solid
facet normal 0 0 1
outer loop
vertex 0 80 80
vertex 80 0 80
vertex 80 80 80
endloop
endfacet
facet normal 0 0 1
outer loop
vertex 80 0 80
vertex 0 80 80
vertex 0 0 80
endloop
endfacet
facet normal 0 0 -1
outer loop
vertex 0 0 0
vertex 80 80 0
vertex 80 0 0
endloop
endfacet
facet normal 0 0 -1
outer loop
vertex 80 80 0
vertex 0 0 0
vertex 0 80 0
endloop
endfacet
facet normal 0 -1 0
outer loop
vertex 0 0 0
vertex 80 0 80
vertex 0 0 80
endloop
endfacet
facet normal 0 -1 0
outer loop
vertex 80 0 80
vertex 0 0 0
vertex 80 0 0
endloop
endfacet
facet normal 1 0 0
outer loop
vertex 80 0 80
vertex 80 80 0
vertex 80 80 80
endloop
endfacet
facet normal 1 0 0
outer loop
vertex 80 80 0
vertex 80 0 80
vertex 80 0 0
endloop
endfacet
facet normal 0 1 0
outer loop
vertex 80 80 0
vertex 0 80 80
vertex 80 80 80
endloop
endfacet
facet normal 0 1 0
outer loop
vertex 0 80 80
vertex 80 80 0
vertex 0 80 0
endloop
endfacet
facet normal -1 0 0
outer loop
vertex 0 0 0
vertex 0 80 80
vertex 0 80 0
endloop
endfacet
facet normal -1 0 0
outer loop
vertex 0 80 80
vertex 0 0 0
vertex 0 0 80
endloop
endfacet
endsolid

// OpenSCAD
// file: shared.scad
size = 80;

edges = [
    [ size / 2, 0, 0 ],
    [ size, size / 2, 0 ],
    [ size / 2, size, 0 ],
    [ 0, size / 2, 0 ],
    [ size / 2, 0, size ],
    [ size, size / 2, size ],
    [ size / 2, size, size ],
    [ 0, size / 2, size ],
    [ 0, 0, size / 2 ],
    [ size, 0, size / 2 ],
    [ size, size, size / 2 ],
    [ 0, size, size / 2 ],
];

corners = [
    [ 0, 0, 0 ],
    [ size, 0, 0 ],
    [ size, size, 0 ],
    [ 0, size, 0 ],
    [ 0, 0, size ],
    [ size, 0, size ],
    [ size, size, size ],
    [ 0, size, size ],
];

edges_and_corners = concat(edges, corners);

// label the edges
// We are adjusting the labels by custom offsets and rotations.
translate(edges[0] + [ 0, 0, -5 ]) rotate([ 90, 0, 0 ]) text("E0", size = 5);
translate(edges[1] + [ 0, -3, -5 ]) rotate([ 90, 0, 90 ]) text("E1", size = 5);
translate(edges[2] + [ 5, 0, -5 ]) rotate([ 90, 0, 180 ]) text("E2", size = 5);
translate(edges[3] + [ 0, 0, -5 ]) rotate([ 90, 0, -90 ]) text("E3", size = 5);
translate(edges[4] + [ 0, 0, 2 ]) rotate([ 90, 0, 0 ]) text("E4", size = 5);
translate(edges[5] + [ 0, -3, 2 ]) rotate([ 90, 0, 90 ]) text("E5", size = 5);
translate(edges[6] + [ 5, 0, 2 ]) rotate([ 90, 0, 180 ]) text("E6", size = 5);
translate(edges[7] + [ 0, 3, 2 ]) rotate([ 90, 0, -90 ]) text("E7", size = 5);
translate(edges[8] + [ -1, 0, 0 ]) rotate([ 0, -90, 90 ]) text("E8", size = 5);
translate(edges[9] + [ 5, 0, 0 ]) rotate([ 90, -90, 0 ]) text("E9", size = 5);
translate(edges[10] + [ 1, 0, 0 ]) rotate([ 180, -90, 90 ]) text("E10", size = 5);
translate(edges[11] + [ -1, 0, 0 ]) rotate([ 0, -90, 0 ]) text("E11", size = 5);

// label the corner points
// We are adjusting the labels by custom offsets and rotations.
translate(corners[0] + [ 0, 0, -5 ]) rotate([ 90, 0, 0 ]) text("C12", size = 5);
translate(corners[1] + [ 0, 0, -5 ]) rotate([ 90, 0, 0 ]) text("C13", size = 5);
translate(corners[2] + [ 0, 0, -5 ]) rotate([ 90, 0, 180 ]) text("C14", size = 5);
translate(corners[3] + [ 0, 0, -5 ]) rotate([ 90, 0, 180 ]) text("C15", size = 5);
translate(corners[4]) rotate([ 90, 0, 0 ]) text("C16", size = 5);
translate(corners[5]) rotate([ 90, 0, 0 ]) text("C17", size = 5);
translate(corners[6]) rotate([ 90, 0, 180 ]) text("C18", size = 5);
translate(corners[7]) rotate([ 90, 0, 180 ]) text("C19", size = 5);

module draw_triangles(triangle_table)
{
    for (i = [0:len(triangle_table) - 1])
    {
        indices = triangle_table[i];

        p0 = edges[indices[0]];
        p1 = edges[indices[1]];
        p2 = edges[indices[2]];

        color([ 1, 1, 1, 0.4 ]) polyhedron(points = [ p0, p1, p2 ], faces = [[ 0, 1, 2 ]]);
        echo("Draw triangle: ", indices[0], indices[1], indices[2]);
    }
}

module create_tetrahedra(tetrahedron_table)
{
    for (i = [0:len(tetrahedron_table) - 1])
    {
        indices = tetrahedron_table[i];

        echo("**RESULT tetrahedron ", i, " indices: ", indices);

        p0 = edges_and_corners[indices[0]];
        p1 = edges_and_corners[indices[1]];
        p2 = edges_and_corners[indices[2]];
        p3 = edges_and_corners[indices[3]];

        color([ 1, 0, 0, 0.5 ])
            polyhedron(points = [ p0, p1, p2, p3 ], faces = [ [ 0, 1, 2 ], [ 0, 2, 3 ], [ 0, 3, 1 ], [ 1, 2, 3 ] ]);
    }
}
// main file
include <shared.scad>;

triangle_table = [
    [ 1, 8, 3 ],
    [ 9, 8, 1 ],
];

draw_triangles(triangle_table);

tetrahedron_table = [
    [ 1, 15, 3, 19 ],
    [ 1, 14, 15, 19 ],
    [ 1, 14, 19, 18 ],
    [ 1, 18, 19, 17 ],
    [ 1, 3, 9, 17 ],
    [ 17, 19, 3, 16 ],
    [ 9, 3, 8, 17 ],
    [ 8, 17, 3, 16 ],
];

create_tetrahedra(tetrahedron_table);

color([ 1, 1, 1, 0.2 ]) cube(size, center = false);
